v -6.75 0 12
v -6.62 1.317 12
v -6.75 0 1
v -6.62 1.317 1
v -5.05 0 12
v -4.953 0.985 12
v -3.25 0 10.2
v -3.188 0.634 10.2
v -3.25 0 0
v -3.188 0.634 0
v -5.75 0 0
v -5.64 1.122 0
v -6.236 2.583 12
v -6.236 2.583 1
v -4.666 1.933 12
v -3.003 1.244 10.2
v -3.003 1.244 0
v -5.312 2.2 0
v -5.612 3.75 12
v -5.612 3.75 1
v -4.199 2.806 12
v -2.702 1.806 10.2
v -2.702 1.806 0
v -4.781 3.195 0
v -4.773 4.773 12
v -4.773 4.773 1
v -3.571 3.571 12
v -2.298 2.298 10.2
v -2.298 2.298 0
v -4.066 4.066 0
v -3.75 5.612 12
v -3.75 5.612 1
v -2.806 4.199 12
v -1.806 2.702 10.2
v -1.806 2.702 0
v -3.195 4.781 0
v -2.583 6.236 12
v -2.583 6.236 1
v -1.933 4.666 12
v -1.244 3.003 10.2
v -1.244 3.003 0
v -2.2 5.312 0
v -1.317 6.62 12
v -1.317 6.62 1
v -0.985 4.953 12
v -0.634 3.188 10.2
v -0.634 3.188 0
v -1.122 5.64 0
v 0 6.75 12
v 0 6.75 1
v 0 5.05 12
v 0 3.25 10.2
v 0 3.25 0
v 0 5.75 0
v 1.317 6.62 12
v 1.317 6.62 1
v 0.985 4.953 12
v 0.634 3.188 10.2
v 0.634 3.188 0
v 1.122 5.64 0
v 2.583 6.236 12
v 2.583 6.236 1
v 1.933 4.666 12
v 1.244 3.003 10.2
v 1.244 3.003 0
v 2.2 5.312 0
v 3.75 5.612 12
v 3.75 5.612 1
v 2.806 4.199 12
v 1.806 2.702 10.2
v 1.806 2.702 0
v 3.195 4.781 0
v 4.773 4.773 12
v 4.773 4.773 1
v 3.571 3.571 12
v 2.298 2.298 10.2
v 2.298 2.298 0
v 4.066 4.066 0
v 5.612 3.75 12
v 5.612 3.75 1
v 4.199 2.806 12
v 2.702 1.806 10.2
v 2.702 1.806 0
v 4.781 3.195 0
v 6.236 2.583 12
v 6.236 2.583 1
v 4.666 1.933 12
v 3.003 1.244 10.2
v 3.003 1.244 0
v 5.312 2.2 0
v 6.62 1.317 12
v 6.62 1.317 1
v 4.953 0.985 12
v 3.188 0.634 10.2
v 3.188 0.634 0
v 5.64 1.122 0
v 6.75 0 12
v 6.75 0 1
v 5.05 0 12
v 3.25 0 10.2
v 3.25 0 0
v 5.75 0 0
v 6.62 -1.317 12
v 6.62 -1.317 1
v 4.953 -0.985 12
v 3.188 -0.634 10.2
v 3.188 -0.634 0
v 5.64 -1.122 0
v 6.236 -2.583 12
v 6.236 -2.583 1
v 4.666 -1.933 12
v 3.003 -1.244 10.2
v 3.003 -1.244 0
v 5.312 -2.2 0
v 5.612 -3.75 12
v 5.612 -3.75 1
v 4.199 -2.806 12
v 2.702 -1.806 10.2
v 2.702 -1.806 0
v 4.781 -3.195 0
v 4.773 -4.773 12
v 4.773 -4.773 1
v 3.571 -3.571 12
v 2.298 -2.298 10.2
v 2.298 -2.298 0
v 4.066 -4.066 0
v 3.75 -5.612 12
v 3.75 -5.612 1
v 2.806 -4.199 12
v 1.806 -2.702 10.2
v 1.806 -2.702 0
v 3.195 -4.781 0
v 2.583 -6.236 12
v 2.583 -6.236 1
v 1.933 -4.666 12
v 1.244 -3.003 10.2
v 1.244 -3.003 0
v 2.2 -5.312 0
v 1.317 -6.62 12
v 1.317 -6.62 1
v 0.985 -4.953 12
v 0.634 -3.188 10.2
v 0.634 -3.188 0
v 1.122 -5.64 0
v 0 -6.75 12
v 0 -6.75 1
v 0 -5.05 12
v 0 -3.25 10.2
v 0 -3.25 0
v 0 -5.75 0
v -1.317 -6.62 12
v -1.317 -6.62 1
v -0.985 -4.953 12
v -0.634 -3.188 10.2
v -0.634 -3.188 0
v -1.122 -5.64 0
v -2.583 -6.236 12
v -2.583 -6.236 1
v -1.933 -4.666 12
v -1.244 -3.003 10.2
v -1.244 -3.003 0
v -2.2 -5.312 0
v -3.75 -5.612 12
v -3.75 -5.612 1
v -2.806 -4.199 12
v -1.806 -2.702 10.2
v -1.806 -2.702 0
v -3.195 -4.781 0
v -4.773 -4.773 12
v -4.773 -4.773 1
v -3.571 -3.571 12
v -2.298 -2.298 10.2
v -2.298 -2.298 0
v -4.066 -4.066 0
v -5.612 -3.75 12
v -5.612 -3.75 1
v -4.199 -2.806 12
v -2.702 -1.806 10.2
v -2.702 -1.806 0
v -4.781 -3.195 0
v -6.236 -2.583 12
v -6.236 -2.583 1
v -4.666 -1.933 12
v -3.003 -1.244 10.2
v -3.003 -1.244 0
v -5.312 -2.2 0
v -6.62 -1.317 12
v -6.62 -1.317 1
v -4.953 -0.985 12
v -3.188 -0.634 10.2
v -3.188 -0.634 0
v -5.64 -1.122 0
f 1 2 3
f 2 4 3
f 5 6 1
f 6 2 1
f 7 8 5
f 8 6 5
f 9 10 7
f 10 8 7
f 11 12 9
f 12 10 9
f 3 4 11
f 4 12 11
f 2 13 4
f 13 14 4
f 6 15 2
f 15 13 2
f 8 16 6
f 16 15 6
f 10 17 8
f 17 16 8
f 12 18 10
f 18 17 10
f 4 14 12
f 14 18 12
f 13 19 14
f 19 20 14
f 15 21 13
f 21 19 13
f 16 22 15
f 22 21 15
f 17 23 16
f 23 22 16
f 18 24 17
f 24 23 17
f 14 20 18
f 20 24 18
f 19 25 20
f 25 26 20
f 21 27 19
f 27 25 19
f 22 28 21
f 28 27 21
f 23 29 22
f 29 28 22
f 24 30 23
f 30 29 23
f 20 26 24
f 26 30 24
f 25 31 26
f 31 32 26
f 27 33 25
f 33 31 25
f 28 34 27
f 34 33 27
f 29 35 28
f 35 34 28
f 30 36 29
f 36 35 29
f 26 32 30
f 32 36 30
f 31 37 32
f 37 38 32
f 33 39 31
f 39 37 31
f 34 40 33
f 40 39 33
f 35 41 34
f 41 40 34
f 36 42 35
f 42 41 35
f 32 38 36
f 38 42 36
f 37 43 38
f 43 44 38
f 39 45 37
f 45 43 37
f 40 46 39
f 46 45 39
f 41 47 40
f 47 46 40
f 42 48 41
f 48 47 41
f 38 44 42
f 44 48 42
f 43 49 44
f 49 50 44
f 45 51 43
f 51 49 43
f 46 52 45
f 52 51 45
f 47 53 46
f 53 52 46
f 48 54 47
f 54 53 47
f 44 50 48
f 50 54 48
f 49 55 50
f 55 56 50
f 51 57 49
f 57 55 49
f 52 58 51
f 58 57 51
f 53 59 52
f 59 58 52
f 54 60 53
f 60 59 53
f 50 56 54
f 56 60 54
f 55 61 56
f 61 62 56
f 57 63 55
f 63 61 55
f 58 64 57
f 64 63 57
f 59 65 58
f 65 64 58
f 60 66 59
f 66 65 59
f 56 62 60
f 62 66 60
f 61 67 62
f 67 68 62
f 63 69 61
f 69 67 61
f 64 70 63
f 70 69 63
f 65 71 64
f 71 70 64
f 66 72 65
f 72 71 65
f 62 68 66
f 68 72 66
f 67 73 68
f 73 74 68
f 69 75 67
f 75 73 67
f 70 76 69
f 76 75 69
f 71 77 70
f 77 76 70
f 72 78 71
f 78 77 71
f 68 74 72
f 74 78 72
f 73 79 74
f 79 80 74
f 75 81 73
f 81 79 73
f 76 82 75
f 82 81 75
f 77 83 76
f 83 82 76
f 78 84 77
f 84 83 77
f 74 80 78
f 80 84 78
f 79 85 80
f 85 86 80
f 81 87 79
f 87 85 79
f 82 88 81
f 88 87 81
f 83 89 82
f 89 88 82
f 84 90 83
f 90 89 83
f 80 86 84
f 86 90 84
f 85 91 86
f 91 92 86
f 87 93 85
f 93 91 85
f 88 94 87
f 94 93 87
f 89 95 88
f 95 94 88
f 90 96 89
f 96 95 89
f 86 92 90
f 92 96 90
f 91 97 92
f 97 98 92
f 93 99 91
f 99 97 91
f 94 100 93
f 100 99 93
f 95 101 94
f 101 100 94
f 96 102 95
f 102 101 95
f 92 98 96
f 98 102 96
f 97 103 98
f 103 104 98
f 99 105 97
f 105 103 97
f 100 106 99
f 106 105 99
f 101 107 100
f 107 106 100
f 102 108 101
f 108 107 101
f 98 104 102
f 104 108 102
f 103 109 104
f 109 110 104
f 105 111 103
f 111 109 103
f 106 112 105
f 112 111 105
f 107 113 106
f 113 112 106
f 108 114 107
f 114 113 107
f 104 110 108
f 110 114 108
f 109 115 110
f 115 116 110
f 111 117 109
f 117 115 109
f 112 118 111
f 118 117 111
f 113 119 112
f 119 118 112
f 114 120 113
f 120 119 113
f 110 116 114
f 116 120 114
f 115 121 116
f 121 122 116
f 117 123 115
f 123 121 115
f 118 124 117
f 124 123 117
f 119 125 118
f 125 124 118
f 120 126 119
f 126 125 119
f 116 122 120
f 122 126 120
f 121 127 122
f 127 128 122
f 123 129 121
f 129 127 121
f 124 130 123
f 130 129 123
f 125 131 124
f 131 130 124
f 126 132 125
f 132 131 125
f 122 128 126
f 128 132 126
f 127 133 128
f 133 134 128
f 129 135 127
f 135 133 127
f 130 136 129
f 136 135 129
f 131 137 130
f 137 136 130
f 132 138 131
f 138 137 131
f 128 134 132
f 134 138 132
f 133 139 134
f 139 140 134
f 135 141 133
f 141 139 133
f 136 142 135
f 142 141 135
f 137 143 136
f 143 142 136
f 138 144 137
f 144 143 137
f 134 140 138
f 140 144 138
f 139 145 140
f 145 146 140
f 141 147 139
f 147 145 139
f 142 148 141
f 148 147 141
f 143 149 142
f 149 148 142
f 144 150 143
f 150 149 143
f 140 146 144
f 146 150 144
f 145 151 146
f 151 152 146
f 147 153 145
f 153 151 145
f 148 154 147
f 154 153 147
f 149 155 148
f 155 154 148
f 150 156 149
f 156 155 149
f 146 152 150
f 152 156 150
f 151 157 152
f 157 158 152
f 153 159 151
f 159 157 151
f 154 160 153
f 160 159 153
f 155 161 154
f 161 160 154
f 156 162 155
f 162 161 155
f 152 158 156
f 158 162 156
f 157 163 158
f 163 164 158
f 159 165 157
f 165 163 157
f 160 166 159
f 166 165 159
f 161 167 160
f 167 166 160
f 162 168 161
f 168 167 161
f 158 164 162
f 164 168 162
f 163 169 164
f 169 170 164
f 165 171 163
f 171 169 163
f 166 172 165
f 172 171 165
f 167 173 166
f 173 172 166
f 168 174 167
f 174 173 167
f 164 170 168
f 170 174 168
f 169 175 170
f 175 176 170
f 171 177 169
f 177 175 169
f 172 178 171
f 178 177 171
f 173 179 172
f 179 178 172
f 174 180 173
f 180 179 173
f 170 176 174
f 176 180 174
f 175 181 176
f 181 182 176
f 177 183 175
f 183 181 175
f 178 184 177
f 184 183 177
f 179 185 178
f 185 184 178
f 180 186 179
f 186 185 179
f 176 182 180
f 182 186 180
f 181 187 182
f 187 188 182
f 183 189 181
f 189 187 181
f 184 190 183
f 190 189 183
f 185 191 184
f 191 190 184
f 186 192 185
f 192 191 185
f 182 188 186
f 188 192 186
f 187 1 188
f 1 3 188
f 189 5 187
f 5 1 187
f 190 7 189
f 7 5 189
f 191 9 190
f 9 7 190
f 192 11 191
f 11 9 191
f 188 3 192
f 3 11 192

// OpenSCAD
$fn = 32;

// ----------------------------------------------------------------------
// Form washer: countersunk washer, 13.5 mm outside, 6.5 mm bore
// ----------------------------------------------------------------------

// --- parameters (mm) ---
revolve_angle = 360;      // full turn around the Z axis
profile_points = 6;       // points of the closed outline

profile = [[3.25, 0], [5.75, 0], [6.75, 1], [6.75, 12], [5.05, 12], [3.25, 10.2]];  // single closed polygon, 6 points, counter clockwise

// --- the one profile operation ---
rotate_extrude(angle = revolve_angle) polygon(points = profile);
